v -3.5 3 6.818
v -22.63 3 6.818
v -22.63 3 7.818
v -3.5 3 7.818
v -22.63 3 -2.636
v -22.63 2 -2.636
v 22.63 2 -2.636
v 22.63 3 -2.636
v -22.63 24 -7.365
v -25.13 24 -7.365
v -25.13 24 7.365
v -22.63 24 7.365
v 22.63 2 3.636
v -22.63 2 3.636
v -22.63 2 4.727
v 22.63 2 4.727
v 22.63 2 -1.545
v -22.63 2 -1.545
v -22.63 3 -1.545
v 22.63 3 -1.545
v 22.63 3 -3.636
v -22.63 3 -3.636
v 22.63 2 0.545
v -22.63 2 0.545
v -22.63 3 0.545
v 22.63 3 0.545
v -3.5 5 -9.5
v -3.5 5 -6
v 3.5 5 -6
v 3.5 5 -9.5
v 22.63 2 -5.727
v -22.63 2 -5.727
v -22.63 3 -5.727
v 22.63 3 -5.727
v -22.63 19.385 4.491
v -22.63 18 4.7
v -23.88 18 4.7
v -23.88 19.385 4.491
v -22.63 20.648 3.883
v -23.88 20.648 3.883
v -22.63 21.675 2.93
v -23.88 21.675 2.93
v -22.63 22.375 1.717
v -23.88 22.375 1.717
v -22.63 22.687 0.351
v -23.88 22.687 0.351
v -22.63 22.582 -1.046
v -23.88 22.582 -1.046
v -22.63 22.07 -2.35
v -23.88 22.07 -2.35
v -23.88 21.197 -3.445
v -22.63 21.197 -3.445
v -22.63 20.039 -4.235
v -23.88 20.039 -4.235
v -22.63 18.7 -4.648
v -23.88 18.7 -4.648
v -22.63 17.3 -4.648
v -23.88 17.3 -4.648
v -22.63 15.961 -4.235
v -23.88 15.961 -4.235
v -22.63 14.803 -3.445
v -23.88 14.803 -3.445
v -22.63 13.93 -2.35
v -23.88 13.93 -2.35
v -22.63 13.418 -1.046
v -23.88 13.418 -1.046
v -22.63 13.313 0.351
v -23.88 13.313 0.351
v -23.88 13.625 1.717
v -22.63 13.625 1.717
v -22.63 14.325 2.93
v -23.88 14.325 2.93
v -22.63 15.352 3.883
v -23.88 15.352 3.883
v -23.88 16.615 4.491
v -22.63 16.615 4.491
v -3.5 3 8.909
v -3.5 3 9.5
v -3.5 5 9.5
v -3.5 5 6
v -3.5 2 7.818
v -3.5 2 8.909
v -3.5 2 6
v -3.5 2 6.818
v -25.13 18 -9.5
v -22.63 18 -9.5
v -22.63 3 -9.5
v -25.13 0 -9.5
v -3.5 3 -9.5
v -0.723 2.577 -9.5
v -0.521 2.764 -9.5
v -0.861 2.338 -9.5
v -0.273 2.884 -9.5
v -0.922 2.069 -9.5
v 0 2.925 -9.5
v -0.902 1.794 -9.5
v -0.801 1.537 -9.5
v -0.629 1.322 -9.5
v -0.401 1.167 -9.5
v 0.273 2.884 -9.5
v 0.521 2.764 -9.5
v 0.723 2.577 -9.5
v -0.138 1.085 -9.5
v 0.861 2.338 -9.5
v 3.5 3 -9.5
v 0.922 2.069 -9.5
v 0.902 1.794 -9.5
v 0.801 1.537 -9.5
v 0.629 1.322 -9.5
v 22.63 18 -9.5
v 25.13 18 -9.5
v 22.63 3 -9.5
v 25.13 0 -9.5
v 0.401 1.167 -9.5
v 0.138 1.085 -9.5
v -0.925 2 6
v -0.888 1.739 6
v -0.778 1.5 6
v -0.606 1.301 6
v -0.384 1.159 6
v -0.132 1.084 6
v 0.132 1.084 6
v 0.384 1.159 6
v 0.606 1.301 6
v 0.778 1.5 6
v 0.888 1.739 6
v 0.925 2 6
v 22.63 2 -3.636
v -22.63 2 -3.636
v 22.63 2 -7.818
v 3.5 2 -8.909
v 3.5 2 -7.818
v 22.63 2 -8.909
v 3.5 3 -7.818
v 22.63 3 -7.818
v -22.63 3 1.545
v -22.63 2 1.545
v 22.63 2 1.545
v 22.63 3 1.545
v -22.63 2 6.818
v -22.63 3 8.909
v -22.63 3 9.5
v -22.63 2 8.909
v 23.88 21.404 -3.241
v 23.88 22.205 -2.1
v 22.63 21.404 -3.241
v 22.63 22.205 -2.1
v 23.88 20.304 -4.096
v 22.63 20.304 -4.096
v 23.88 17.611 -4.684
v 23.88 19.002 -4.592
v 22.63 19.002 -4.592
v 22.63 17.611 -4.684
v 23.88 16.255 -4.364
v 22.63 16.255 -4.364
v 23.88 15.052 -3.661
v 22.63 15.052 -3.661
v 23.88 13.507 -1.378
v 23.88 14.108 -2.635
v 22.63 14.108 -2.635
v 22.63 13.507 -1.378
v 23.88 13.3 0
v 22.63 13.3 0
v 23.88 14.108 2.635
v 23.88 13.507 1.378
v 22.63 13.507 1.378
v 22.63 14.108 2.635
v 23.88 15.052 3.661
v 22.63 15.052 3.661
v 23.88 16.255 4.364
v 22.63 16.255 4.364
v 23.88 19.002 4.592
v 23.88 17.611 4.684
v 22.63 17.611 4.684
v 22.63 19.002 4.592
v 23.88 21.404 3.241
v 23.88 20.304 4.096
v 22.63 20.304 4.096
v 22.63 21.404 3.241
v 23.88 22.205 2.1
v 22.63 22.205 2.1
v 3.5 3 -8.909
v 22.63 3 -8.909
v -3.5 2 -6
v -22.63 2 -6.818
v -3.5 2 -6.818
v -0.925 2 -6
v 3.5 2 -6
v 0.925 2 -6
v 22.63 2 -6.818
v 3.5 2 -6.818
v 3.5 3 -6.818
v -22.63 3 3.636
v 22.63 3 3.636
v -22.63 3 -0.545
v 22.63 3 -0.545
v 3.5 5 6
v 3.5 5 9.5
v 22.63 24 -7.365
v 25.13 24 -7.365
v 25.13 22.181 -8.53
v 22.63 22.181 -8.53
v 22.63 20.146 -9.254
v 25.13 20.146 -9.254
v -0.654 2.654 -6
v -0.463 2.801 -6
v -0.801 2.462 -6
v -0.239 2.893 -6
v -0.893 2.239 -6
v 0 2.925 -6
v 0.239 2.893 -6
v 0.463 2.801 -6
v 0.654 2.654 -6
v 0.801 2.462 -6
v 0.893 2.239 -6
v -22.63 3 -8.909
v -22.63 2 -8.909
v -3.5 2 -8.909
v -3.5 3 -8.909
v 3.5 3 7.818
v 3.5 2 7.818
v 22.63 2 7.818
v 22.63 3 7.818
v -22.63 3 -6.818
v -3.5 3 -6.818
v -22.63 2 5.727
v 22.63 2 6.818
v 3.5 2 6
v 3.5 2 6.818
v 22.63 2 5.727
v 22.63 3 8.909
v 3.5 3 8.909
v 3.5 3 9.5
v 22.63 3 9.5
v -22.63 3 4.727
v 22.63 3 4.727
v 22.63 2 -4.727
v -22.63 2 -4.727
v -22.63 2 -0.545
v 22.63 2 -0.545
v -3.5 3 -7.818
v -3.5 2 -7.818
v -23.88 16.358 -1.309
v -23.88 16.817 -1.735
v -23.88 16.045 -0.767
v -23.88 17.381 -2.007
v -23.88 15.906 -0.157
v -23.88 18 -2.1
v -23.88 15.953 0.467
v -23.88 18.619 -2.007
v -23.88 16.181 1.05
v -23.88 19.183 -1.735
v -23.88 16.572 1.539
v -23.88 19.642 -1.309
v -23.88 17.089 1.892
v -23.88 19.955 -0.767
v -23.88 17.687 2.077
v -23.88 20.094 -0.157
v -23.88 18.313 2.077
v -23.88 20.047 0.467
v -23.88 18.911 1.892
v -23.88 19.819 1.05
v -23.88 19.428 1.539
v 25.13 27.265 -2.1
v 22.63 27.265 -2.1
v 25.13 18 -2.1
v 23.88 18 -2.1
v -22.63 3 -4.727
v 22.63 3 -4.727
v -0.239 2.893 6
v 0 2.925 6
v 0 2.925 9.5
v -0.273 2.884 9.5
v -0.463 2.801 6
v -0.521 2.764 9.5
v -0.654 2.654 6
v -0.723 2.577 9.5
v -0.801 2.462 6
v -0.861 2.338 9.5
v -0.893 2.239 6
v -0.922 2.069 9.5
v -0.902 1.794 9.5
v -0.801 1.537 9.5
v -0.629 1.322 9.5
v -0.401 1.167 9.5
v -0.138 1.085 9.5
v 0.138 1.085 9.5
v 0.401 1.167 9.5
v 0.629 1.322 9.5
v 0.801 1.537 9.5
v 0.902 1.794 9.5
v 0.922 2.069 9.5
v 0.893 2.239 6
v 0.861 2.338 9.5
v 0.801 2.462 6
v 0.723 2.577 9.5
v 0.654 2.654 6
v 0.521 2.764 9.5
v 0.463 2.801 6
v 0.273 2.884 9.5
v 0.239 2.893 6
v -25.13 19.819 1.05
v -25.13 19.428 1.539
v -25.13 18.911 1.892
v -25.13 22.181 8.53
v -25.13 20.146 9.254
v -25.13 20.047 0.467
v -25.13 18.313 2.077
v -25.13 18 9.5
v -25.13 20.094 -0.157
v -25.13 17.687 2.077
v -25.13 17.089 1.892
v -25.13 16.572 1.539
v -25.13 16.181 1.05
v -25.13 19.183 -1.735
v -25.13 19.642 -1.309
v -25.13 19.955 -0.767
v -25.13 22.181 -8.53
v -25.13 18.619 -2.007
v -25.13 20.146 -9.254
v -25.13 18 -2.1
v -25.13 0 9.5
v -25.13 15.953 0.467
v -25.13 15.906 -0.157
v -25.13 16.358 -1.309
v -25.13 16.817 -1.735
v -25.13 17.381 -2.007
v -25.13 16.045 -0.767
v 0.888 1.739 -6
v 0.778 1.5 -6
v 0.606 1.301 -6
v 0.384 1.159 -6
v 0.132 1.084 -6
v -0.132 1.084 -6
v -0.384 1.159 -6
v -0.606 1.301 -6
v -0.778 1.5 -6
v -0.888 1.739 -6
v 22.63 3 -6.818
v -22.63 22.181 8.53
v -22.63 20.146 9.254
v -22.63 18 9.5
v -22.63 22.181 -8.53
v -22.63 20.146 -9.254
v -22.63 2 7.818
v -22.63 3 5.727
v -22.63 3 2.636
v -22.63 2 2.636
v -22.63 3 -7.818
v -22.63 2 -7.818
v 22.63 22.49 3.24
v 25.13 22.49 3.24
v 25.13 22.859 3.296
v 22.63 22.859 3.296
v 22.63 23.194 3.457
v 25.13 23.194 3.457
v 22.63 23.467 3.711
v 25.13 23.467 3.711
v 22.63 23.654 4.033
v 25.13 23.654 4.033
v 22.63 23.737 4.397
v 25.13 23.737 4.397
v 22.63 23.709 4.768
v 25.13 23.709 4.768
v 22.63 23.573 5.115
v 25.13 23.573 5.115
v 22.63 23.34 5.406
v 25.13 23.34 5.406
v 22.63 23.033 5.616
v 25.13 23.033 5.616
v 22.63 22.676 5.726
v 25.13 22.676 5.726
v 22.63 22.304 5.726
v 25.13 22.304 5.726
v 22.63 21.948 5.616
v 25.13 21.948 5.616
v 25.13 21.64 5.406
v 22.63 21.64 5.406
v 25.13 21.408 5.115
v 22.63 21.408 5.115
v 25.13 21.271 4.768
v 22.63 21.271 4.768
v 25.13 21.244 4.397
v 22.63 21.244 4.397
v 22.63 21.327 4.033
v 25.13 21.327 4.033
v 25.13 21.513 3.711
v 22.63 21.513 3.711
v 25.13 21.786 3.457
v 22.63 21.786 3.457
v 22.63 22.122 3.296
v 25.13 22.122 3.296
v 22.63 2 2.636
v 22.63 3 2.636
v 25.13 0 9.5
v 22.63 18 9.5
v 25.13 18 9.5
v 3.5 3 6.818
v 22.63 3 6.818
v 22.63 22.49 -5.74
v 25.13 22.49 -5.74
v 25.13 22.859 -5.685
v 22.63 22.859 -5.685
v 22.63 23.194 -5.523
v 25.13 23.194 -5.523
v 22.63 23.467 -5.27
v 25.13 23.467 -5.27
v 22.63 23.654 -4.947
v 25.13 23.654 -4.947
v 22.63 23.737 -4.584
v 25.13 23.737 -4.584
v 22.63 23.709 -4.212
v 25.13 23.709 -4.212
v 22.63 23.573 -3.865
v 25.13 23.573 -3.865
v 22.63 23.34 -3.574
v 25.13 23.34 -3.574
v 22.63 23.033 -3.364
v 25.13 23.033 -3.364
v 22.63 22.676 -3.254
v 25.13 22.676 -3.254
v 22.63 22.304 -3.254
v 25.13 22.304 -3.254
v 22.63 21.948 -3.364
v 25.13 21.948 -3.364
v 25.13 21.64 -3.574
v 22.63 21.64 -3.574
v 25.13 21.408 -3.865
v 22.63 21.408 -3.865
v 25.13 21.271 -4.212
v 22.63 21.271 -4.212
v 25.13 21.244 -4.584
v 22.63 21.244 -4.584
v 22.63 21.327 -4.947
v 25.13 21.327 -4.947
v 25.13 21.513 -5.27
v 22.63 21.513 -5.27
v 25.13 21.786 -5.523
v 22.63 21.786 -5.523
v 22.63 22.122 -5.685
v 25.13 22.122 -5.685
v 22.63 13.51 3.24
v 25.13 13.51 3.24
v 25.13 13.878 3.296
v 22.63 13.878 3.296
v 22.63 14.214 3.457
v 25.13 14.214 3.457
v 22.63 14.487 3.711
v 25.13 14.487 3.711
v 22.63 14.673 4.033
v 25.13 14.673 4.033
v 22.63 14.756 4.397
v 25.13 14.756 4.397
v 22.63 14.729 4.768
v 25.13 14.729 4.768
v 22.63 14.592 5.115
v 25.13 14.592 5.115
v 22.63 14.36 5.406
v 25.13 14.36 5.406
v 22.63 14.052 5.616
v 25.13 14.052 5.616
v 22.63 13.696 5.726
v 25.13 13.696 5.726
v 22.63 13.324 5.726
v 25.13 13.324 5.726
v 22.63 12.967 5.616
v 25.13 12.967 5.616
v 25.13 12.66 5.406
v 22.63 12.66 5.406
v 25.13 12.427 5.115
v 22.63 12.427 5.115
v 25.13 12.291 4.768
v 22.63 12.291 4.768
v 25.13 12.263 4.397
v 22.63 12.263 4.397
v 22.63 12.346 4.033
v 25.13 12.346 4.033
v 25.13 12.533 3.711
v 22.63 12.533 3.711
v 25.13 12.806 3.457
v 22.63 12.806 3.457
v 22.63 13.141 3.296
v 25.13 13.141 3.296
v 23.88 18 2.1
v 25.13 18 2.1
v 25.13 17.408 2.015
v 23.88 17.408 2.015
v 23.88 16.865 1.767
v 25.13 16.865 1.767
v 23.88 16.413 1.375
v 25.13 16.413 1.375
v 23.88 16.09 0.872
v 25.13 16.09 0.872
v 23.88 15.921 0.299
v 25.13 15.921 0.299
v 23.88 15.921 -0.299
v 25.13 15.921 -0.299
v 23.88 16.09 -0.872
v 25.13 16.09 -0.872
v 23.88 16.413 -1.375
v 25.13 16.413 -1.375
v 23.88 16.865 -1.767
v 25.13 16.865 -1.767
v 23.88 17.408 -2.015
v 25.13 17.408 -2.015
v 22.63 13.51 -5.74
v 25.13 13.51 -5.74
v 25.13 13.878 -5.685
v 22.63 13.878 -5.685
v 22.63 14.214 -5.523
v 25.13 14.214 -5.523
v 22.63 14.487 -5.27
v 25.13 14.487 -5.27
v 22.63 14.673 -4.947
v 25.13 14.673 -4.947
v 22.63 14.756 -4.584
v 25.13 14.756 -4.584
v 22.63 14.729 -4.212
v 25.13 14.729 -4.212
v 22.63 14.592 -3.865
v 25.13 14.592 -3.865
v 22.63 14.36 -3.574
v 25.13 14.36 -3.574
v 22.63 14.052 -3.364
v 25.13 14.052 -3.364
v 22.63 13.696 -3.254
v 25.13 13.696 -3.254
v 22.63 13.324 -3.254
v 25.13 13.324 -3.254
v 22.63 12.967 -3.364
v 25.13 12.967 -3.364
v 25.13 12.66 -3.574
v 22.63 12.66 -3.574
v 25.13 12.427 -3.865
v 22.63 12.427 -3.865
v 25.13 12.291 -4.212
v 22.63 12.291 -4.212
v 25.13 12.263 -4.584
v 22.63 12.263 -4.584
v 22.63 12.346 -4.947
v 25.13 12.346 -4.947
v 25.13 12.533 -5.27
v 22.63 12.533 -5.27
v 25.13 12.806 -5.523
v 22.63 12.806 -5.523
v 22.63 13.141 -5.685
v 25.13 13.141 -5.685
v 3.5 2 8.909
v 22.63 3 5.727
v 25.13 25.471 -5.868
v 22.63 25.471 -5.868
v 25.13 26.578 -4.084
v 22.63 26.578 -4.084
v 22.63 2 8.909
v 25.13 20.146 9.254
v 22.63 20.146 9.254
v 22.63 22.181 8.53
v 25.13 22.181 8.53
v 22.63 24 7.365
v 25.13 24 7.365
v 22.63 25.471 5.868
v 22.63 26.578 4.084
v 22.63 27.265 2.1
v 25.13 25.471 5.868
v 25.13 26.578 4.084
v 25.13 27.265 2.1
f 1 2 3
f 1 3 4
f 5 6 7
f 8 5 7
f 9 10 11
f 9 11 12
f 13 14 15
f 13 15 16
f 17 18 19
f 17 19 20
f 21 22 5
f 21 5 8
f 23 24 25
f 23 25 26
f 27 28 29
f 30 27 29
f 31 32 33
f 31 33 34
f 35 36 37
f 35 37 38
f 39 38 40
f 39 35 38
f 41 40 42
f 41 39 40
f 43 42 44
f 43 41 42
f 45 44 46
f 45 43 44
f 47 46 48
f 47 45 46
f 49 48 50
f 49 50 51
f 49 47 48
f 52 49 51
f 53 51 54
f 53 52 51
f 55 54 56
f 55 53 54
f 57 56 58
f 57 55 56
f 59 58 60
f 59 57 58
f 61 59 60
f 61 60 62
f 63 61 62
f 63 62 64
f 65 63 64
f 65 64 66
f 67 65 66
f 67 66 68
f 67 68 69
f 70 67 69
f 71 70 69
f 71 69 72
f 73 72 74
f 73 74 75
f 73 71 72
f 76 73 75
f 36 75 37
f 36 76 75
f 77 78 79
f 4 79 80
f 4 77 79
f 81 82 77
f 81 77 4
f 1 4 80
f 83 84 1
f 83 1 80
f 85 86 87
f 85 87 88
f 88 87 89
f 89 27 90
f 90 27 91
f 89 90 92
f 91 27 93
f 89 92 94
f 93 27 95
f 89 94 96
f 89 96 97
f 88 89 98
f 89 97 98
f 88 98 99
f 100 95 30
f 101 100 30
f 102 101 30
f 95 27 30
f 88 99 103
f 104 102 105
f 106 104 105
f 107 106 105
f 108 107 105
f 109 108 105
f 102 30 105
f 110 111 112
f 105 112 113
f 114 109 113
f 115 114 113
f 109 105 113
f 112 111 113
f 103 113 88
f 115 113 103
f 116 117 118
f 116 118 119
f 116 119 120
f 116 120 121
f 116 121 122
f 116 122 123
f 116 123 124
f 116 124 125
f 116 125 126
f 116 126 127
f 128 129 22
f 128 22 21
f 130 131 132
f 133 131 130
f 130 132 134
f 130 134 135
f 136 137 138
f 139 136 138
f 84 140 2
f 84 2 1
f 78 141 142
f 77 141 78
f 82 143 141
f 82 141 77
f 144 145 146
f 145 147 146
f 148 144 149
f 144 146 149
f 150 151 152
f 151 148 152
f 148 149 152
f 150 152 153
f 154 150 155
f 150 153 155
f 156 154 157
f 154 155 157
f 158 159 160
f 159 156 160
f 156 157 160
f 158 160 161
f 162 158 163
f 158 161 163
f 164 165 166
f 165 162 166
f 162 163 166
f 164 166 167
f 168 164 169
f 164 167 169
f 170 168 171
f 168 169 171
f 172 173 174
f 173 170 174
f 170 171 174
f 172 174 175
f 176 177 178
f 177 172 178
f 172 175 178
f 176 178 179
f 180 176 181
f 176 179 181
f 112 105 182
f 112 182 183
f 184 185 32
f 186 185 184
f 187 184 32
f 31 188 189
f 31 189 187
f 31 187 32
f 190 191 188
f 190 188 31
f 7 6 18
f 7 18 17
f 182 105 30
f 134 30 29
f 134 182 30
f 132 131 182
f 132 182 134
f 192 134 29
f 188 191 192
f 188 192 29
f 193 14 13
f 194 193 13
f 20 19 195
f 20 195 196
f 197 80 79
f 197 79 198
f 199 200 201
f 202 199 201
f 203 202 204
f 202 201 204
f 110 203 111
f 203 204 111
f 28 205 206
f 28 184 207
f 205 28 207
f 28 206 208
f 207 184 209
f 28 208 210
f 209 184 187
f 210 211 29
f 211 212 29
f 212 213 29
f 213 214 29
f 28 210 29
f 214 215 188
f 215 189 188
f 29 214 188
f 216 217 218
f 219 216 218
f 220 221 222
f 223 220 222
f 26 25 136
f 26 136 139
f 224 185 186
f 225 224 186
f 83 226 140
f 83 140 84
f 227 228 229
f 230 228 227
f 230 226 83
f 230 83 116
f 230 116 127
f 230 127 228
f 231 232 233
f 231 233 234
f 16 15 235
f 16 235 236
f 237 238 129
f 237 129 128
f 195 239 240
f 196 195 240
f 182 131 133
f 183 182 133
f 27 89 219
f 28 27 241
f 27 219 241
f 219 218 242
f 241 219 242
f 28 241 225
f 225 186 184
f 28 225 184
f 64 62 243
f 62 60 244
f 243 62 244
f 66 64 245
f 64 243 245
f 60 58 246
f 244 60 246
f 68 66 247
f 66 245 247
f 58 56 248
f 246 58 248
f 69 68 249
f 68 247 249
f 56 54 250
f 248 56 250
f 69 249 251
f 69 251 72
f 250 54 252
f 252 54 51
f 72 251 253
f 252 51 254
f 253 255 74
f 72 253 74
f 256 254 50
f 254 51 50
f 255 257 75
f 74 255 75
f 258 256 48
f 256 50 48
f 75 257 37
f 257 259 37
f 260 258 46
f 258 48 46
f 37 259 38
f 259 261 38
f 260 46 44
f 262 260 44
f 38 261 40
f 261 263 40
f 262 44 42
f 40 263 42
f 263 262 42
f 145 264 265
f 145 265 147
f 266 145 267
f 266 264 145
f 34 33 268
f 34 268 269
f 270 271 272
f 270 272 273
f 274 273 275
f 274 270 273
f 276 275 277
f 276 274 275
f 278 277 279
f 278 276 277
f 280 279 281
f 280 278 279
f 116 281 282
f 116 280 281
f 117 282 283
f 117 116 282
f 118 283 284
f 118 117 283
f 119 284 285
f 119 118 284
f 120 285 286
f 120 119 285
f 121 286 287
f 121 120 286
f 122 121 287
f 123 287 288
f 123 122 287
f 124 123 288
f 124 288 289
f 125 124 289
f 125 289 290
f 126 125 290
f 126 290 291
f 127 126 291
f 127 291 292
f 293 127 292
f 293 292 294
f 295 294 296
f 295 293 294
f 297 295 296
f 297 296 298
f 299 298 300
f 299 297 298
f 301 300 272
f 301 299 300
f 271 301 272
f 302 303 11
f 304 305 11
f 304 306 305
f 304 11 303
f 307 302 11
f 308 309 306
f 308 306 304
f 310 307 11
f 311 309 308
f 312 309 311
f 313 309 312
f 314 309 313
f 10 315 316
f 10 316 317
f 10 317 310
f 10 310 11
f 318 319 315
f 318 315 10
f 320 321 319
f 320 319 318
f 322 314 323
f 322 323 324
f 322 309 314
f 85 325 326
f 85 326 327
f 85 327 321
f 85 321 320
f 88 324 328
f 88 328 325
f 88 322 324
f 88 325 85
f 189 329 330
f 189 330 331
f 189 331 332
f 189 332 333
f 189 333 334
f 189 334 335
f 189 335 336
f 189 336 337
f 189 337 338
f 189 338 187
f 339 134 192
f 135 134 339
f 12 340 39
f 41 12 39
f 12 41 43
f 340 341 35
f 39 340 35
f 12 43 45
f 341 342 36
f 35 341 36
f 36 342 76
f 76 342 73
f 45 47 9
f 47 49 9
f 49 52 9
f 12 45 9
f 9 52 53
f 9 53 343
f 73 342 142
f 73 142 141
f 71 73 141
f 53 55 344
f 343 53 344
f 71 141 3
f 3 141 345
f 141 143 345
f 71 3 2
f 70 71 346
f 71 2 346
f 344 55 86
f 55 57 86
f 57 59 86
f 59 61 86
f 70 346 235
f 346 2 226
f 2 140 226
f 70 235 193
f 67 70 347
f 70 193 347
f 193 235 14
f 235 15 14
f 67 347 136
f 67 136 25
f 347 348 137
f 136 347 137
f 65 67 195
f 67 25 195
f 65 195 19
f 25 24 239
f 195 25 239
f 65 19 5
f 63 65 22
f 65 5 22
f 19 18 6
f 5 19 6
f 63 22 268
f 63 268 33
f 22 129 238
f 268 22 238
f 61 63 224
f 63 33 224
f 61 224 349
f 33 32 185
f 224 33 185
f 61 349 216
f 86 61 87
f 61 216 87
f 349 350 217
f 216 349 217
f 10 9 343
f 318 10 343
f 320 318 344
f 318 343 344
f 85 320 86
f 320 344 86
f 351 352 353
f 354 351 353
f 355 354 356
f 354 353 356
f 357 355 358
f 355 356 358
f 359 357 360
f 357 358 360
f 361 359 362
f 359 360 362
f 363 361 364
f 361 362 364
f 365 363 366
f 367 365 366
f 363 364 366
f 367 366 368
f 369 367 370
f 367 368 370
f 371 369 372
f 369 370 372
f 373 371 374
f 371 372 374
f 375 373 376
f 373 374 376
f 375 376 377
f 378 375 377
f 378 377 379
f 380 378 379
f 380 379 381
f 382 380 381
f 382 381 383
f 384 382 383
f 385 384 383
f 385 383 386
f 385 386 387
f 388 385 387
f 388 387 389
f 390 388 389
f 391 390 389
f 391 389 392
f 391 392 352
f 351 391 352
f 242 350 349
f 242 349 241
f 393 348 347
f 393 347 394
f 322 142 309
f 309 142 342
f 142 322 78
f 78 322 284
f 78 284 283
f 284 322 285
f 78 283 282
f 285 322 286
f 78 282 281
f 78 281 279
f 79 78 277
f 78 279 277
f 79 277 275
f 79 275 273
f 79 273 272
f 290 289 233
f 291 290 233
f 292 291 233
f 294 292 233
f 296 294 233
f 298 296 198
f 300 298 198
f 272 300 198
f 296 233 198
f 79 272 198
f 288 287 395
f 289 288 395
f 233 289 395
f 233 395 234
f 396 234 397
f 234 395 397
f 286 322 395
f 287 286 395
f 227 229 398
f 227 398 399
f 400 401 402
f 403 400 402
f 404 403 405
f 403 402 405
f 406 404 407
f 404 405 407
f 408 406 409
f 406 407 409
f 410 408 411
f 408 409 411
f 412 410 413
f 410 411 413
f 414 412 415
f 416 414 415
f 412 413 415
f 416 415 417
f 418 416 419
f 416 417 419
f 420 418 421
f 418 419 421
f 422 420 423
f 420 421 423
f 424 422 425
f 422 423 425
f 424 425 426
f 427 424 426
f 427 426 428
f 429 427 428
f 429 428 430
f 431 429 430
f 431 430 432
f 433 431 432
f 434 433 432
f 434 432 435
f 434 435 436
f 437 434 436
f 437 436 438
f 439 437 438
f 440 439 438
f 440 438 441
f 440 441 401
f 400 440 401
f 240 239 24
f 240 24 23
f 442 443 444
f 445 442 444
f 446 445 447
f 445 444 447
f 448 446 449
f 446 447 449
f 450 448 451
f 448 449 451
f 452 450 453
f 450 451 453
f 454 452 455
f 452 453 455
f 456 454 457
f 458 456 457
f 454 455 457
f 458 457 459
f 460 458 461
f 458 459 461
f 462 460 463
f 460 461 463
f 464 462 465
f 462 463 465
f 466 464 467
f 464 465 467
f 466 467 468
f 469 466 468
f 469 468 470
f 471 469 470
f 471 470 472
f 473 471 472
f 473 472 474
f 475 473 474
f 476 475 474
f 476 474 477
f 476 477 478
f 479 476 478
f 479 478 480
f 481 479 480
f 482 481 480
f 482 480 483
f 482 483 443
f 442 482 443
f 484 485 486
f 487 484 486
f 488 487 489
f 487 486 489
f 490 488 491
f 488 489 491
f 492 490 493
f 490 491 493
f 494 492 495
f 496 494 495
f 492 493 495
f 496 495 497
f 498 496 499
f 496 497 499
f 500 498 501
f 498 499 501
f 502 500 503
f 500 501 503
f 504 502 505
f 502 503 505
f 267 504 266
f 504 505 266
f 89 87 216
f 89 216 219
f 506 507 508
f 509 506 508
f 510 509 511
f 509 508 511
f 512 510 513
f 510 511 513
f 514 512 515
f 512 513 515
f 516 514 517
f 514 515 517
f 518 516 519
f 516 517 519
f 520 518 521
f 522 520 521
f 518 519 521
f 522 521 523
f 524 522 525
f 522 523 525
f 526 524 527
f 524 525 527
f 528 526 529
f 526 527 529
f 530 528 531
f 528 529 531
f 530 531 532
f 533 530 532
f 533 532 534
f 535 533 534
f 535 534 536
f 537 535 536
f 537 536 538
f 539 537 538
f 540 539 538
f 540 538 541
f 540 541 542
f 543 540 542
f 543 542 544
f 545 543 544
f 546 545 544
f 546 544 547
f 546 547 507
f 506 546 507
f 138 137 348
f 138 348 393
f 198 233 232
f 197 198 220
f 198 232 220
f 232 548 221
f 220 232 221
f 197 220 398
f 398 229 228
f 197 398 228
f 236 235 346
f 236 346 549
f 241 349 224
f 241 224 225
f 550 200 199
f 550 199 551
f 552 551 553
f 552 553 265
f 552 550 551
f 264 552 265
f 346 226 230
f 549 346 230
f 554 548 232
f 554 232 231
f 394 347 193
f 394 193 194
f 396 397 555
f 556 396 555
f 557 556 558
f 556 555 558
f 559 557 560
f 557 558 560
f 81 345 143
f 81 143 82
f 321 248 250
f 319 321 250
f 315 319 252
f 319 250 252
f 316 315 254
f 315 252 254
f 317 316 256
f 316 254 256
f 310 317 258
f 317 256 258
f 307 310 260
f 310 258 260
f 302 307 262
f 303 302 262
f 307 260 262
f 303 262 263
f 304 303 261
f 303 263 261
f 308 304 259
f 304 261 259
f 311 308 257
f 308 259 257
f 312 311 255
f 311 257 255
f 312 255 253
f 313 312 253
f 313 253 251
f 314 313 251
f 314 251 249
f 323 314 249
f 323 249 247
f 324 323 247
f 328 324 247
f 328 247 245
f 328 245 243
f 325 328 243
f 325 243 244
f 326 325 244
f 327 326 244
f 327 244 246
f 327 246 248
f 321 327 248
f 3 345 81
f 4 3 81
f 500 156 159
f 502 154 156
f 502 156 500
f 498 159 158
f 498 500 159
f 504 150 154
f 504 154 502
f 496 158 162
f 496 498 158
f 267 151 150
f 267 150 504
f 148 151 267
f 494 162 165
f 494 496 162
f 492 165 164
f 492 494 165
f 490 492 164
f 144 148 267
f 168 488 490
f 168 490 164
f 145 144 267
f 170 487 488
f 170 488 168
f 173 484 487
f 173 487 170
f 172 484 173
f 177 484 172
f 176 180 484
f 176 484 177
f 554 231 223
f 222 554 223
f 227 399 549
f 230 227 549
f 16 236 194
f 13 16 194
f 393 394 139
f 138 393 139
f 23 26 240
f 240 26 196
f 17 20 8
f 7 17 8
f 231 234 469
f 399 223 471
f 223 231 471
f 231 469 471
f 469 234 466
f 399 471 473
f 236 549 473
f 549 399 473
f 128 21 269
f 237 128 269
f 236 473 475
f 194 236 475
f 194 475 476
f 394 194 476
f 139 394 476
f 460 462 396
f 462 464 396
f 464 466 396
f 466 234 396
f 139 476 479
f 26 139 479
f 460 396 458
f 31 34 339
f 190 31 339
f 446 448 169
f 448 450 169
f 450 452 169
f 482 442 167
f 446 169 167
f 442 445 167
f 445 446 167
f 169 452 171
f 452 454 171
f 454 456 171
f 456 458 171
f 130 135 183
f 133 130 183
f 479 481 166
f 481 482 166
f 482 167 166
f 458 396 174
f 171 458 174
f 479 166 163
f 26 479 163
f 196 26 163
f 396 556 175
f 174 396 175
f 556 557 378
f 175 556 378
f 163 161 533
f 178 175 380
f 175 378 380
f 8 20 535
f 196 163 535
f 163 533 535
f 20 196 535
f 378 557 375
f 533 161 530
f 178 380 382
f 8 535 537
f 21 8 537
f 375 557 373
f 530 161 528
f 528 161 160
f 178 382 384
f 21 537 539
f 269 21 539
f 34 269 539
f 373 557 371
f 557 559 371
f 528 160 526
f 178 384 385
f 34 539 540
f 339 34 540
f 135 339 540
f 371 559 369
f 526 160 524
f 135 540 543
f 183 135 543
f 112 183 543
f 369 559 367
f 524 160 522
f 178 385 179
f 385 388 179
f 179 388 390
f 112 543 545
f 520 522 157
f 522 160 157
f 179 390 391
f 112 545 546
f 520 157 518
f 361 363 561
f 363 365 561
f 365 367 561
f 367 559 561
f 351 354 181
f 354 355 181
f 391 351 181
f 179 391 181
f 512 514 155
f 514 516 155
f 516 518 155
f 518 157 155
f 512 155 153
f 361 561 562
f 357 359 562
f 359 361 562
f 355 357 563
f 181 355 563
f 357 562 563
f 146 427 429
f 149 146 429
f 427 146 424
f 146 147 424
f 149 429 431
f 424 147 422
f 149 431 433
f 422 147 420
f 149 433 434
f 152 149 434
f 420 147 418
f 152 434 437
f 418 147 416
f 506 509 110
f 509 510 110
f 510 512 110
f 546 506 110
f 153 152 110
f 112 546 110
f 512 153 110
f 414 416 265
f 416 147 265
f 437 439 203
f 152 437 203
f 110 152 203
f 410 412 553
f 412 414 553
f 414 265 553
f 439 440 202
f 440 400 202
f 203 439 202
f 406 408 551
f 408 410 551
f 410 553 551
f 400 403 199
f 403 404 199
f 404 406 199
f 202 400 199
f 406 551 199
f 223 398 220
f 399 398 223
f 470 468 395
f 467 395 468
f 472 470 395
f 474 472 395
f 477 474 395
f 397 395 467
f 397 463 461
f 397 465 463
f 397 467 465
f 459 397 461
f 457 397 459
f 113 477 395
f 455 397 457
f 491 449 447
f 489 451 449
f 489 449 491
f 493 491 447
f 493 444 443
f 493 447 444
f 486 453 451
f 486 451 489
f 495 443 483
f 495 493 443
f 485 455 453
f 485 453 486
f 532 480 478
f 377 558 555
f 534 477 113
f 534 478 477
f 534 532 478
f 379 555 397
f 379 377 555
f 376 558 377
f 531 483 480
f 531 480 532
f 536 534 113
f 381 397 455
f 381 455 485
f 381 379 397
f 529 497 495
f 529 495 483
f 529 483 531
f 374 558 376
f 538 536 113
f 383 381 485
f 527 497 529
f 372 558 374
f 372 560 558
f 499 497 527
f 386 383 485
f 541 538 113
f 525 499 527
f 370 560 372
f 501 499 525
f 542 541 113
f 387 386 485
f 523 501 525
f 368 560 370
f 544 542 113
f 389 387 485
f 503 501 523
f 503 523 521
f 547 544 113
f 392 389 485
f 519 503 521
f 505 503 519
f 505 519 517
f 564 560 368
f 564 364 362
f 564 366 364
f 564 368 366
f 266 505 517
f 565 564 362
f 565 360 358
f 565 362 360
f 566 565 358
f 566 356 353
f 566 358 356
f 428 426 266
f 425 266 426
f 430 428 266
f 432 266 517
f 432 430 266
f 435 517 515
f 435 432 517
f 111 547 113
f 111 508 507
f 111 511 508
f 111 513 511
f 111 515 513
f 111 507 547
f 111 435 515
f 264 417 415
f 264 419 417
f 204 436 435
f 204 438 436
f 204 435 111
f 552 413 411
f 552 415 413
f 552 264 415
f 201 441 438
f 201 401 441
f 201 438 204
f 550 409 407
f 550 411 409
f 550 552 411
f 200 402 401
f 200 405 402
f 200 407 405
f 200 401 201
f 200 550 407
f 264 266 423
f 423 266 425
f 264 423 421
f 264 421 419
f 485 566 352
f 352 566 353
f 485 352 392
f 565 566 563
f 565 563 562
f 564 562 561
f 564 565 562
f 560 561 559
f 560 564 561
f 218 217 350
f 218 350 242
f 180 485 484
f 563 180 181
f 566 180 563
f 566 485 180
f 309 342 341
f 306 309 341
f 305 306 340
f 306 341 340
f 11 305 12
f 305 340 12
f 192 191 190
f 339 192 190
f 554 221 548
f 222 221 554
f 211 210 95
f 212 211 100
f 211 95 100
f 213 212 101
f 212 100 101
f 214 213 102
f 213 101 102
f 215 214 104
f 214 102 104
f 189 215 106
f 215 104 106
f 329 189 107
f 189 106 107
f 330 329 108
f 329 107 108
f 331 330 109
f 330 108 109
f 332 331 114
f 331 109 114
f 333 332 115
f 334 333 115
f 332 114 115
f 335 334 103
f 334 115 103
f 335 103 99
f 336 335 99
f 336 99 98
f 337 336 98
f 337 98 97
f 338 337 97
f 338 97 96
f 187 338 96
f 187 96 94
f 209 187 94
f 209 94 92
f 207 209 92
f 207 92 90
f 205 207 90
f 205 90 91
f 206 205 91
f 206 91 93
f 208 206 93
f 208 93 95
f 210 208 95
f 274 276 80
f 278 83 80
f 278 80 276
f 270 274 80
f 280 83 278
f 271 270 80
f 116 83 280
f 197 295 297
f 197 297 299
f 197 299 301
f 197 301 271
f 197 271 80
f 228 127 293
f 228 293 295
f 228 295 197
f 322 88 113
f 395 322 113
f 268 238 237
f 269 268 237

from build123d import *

# Parameters (mm, degrees)
SKETCH1_W           = 50.26
SKETCH1_H           = 24
BOSS_EXTRUDE1_DEPTH = 2
SKETCH2_W           = 2.5
SKETCH2_H           = 24
BOSS_EXTRUDE2_DEPTH = 22
SKETCH3_R           = 2.1
CUT_EXTRUDE1_DEPTH  = 57.974271386
SKETCH4_R           = 4.7
CUT_EXTRUDE2_DEPTH  = 1.25
CUT_EXTRUDE3_REACH  = 58.974
SKETCH5_R           = 1.25
CUT_EXTRUDE4_REACH  = 58.974
SKETCH7_W           = 45.26
SKETCH7_H           = 1
BOSS_EXTRUDE3_DEPTH = 1
LPATTERN3_COUNT     = 12
LPATTERN3_PITCH     = 2.090909091
BOSS_EXTRUDE4_DEPTH = 2.5
CUT_EXTRUDE6_DEPTH  = 59.424713631
BOSS_EXTRUDE5_START = -1
SKETCH12_W          = 7
SKETCH12_H          = 3.5
BOSS_EXTRUDE5_DEPTH = 3
SKETCH13_R          = 0.925
CUT_EXTRUDE7_DEPTH  = 3.5
CUT_EXTRUDE9_START  = -3.5
SKETCH14_R          = 0.925
CUT_EXTRUDE9_DEPTH  = 3.5


with BuildPart() as part:
    # Sketch1 → Boss-Extrude1 (new body)
    with BuildSketch(Plane(origin=(0, 0, 0), x_dir=(1, 0, 0), z_dir=(0, 1, 0))):
        Rectangle(SKETCH1_W, SKETCH1_H)
    extrude(amount=BOSS_EXTRUDE1_DEPTH)

    # Sketch2 → Boss-Extrude2 (add)
    with BuildSketch(Plane(origin=(0, 2, 0), x_dir=(1, 0, 0), z_dir=(0, 1, 0))):
        with Locations((-23.88, 0)):
            Rectangle(SKETCH2_W, SKETCH2_H)
        with Locations((23.88, 0)):
            Rectangle(SKETCH2_W, SKETCH2_H)
    extrude(amount=BOSS_EXTRUDE2_DEPTH)

    # Sketch3 → Cut-Extrude1 (cut, through all)
    with BuildSketch(Plane(origin=(25.13, 0, 0), x_dir=(0, 0, -1), z_dir=(1, 0, 0))):
        with Locations((0, 18)):
            Circle(SKETCH3_R)
    extrude(amount=-CUT_EXTRUDE1_DEPTH, mode=Mode.SUBTRACT)

    # Sketch4 → Cut-Extrude2 (cut)
    with BuildSketch(Plane.ZY.offset(-22.63)):
        with Locations((0, 18)):
            Circle(SKETCH4_R)
    cut_extrude2 = extrude(amount=-CUT_EXTRUDE2_DEPTH, mode=Mode.SUBTRACT)

    # Mirror1: Cut-Extrude2 across plane
    add(cut_extrude2.mirror(Plane.ZY), mode=Mode.SUBTRACT)

    # Sketch5 → Cut-Extrude3 (cut, up to next)
    with BuildSketch(Plane(origin=(25.13, 0, 0), x_dir=(0, 0, -1), z_dir=(1, 0, 0)), mode=Mode.PRIVATE) as cut_extrude3_sk1:
        with Locations((4.49015, 13.50985)):
            Circle(SKETCH5_R)
    cut_extrude3_tool1 = extrude(cut_extrude3_sk1.sketch, amount=-CUT_EXTRUDE3_REACH, mode=Mode.PRIVATE) & part.part
    # Sketch5 → Cut-Extrude3 (cut, up to next)
    with BuildSketch(Plane(origin=(25.13, 0, 0), x_dir=(0, 0, -1), z_dir=(1, 0, 0)), mode=Mode.PRIVATE) as cut_extrude3_sk2:
        with Locations((-4.49015, 13.50985)):
            Circle(SKETCH5_R)
    cut_extrude3_tool2 = extrude(cut_extrude3_sk2.sketch, amount=-CUT_EXTRUDE3_REACH, mode=Mode.PRIVATE) & part.part
    # Sketch5 → Cut-Extrude3 (cut, up to next)
    with BuildSketch(Plane(origin=(25.13, 0, 0), x_dir=(0, 0, -1), z_dir=(1, 0, 0)), mode=Mode.PRIVATE) as cut_extrude3_sk3:
        with Locations((-4.49015, 22.49015)):
            Circle(SKETCH5_R)
    cut_extrude3_tool3 = extrude(cut_extrude3_sk3.sketch, amount=-CUT_EXTRUDE3_REACH, mode=Mode.PRIVATE) & part.part
    # Sketch5 → Cut-Extrude3 (cut, up to next)
    with BuildSketch(Plane(origin=(25.13, 0, 0), x_dir=(0, 0, -1), z_dir=(1, 0, 0)), mode=Mode.PRIVATE) as cut_extrude3_sk4:
        with Locations((4.49015, 22.49015)):
            Circle(SKETCH5_R)
    cut_extrude3_tool4 = extrude(cut_extrude3_sk4.sketch, amount=-CUT_EXTRUDE3_REACH, mode=Mode.PRIVATE) & part.part
    add(cut_extrude3_tool1.solids().sort_by_distance((25.13, 13.50985, -4.49015))[0], mode=Mode.SUBTRACT)
    add(cut_extrude3_tool2.solids().sort_by_distance((25.13, 13.50985, 4.49015))[0], mode=Mode.SUBTRACT)
    add(cut_extrude3_tool3.solids().sort_by_distance((25.13, 22.49015, 4.49015))[0], mode=Mode.SUBTRACT)
    add(cut_extrude3_tool4.solids().sort_by_distance((25.13, 22.49015, -4.49015))[0], mode=Mode.SUBTRACT)

    # Sketch6 → Cut-Extrude4 (cut, up to next)
    with BuildSketch(Plane(origin=(25.13, 0, 0), x_dir=(0, 0, -1), z_dir=(1, 0, 0)), mode=Mode.PRIVATE) as cut_extrude4_sk1:
        with BuildLine():
            Line((-2.1, 18), (-2.1, 24))
            Line((-2.1, 24), (2.1, 24))
            Line((2.1, 24), (2.1, 18))
            ThreePointArc((2.1, 18), (0, 15.9), (-2.1, 18))
        make_face()
    cut_extrude4_tool1 = extrude(cut_extrude4_sk1.sketch, amount=-CUT_EXTRUDE4_REACH, mode=Mode.PRIVATE) & part.part
    add(cut_extrude4_tool1.solids().sort_by_distance((25.13, 20.160972, 0))[0], mode=Mode.SUBTRACT)

    # Sketch7 → Boss-Extrude3 (add)
    with BuildSketch(Plane(origin=(0, 2, 0), x_dir=(1, 0, 0), z_dir=(0, 1, 0))):
        with Locations((0, -11.5)):
            Rectangle(SKETCH7_W, SKETCH7_H)
    boss_extrude3 = extrude(amount=BOSS_EXTRUDE3_DEPTH)

    # LPattern3: Boss-Extrude3 ×12
    with Locations(*[(0, 0, -i * LPATTERN3_PITCH) for i in range(1, LPATTERN3_COUNT)]):
        add(boss_extrude3)

    # Sketch9 → Boss-Extrude4 (add)
    with BuildSketch(Plane(origin=(25.13, 0, 0), x_dir=(0, 0, -1), z_dir=(1, 0, 0))):
        with BuildLine():
            Line((2.1, 24), (7.365459931, 24))
            ThreePointArc((7.365459931, 24), (5.006372874, 26.073799022), (2.1, 27.264987858))
            Line((2.1, 27.264987858), (2.1, 24))
        make_face()
        with BuildLine():
            Line((-7.365459931, 24), (-2.1, 24))
            Line((-2.1, 24), (-2.1, 27.264987858))
            ThreePointArc((-2.1, 27.264987858), (-5.006372874, 26.073799022), (-7.365459931, 24))
        make_face()
    extrude(amount=-BOSS_EXTRUDE4_DEPTH)

    # Sketch10 → Cut-Extrude6 (cut, through all)
    with BuildSketch(Plane(origin=(25.13, 0, 0), x_dir=(0, 0, -1), z_dir=(1, 0, 0))):
        with BuildLine():
            Line((-9.5, 0), (-9.5, 18))
            ThreePointArc((-9.5, 18), (-8.950471198, 21.184189901), (-7.365459931, 24))
            Line((-7.365459931, 24), (-9.5, 24))
            Line((-9.5, 24), (-12, 24))
            Line((-12, 24), (-12, 0))
            Line((-12, 0), (-9.5, 0))
        make_face()
        with BuildLine():
            Line((9.5, 24), (7.365459931, 24))
            ThreePointArc((7.365459931, 24), (8.950471198, 21.184189901), (9.5, 18))
            Line((9.5, 18), (9.5, 0))
            Line((9.5, 0), (12, 0))
            Line((12, 0), (12, 24))
            Line((12, 24), (9.5, 24))
        make_face()
    extrude(amount=-CUT_EXTRUDE6_DEPTH, mode=Mode.SUBTRACT)

    # Sketch12 → Boss-Extrude5 (add)
    with BuildSketch(Plane(origin=(0, 3, 0), x_dir=(1, 0, 0), z_dir=(0, 1, 0)).offset(BOSS_EXTRUDE5_START)):
        with Locations((0, -7.75)):
            Rectangle(SKETCH12_W, SKETCH12_H)
    boss_extrude5 = extrude(amount=BOSS_EXTRUDE5_DEPTH)

    # Mirror2: Boss-Extrude5 across plane
    add(boss_extrude5.mirror(Plane.XY))

    # Sketch13 → Cut-Extrude7 (cut)
    with BuildSketch(Plane(origin=(0, 0, -9.5), x_dir=(-1, 0, 0), z_dir=(0, 0, -1))):
        with Locations(Location((0, 2, 0), (0, 0, 90))):
            Circle(SKETCH13_R)
    extrude(amount=-CUT_EXTRUDE7_DEPTH, mode=Mode.SUBTRACT)

    # Sketch14 → Cut-Extrude9 (cut)
    with BuildSketch(Plane.XY.offset(9.5).offset(CUT_EXTRUDE9_START)):
        with Locations(Location((0, 2, 0), (0, 0, 90))):
            Circle(SKETCH14_R)
    extrude(amount=CUT_EXTRUDE9_DEPTH, mode=Mode.SUBTRACT)


solid = part.part
